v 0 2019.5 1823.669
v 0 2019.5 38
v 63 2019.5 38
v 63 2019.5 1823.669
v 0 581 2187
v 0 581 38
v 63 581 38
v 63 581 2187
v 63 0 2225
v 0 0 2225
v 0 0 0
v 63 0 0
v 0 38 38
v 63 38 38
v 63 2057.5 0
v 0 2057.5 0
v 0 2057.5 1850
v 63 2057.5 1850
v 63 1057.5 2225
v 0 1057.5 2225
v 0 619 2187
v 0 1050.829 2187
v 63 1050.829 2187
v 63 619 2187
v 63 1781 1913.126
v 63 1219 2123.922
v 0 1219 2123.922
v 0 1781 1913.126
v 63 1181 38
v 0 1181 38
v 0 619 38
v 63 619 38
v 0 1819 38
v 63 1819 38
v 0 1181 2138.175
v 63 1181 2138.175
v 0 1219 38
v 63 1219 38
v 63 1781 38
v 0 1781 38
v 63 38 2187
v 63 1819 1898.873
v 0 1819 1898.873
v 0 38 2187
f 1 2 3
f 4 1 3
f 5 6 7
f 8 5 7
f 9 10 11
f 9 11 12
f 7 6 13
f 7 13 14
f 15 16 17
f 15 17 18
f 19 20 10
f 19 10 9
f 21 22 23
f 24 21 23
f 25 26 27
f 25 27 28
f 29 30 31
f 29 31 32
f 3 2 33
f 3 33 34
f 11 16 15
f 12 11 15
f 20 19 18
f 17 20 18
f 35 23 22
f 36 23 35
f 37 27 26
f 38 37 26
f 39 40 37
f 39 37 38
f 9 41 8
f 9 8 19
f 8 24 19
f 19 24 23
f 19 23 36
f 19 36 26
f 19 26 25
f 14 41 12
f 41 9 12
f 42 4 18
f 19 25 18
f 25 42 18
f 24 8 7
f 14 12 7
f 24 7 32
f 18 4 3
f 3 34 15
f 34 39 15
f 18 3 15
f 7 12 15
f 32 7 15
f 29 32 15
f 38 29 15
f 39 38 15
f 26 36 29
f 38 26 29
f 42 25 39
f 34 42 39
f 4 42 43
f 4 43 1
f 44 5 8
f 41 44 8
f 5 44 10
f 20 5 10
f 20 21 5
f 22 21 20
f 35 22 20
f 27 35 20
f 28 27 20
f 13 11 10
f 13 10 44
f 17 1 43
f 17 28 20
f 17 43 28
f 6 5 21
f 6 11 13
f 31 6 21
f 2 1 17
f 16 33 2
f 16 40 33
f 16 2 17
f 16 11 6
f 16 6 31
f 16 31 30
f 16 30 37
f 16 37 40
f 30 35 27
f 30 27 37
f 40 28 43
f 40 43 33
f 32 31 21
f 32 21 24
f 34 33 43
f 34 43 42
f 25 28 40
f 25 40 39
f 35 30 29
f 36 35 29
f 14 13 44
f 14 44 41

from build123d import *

# Parameters (mm, degrees)
F0_W      = 63
F0_H      = 2057.5
F1_DEPTH  = 38
F2_W      = 63
F2_H      = 38
F3_DEPTH  = 2149
F4_W      = 63
F4_H      = 38
F5_DEPTH  = 2149
F6_W      = 63
F6_H      = 38
F7_DEPTH  = 2149
F8_W      = 63
F8_H      = 38
F9_DEPTH  = 2149
F10_W     = 63
F10_H     = 38
F11_DEPTH = 2149
F12_W     = 63
F12_H     = 1819.5122480392
F13_DEPTH = 38
F15_DEPTH = 63
F17_DEPTH = 63


with BuildPart() as f1:
    # F0 (on Top) → F1 (new body)
    with BuildSketch(Plane.XY):
        with Locations((31.5, 1028.75)):
            Rectangle(F0_W, F0_H)
    extrude(amount=F1_DEPTH)

    # F2 (on face) → F3 (join)
    with BuildSketch(Plane.XY.offset(38)):
        with Locations((31.5, 19)):
            Rectangle(F2_W, F2_H)
    extrude(amount=F3_DEPTH)

    # F4 (on face) → F5 (join)
    with BuildSketch(Plane.XY.offset(38)):
        with Locations((31.5, 600)):
            Rectangle(F4_W, F4_H)
    extrude(amount=F5_DEPTH)

    # F6 (on face) → F7 (join)
    with BuildSketch(Plane.XY.offset(38)):
        with Locations((31.5, 1200)):
            Rectangle(F6_W, F6_H)
    extrude(amount=F7_DEPTH)

    # F8 (on face) → F9 (join)
    with BuildSketch(Plane.XY.offset(38)):
        with Locations((31.5, 1800)):
            Rectangle(F8_W, F8_H)
    extrude(amount=F9_DEPTH)

    # F10 (on face) → F11 (join)
    with BuildSketch(Plane.XY.offset(38)):
        with Locations((31.5, 2038.5)):
            Rectangle(F10_W, F10_H)
    extrude(amount=F11_DEPTH)

    # F12 (on face) → F13 (join)
    with BuildSketch(Plane.XY.offset(2187)):
        with Locations((31.5, 909.7561240196)):
            Rectangle(F12_W, F12_H)
    extrude(amount=F13_DEPTH)

    # F14 (on face) → F15 (join)
    with BuildSketch(Plane.YZ.offset(63)):
        Polygon((1158.8333333333, 2187), (1057.5, 2225), (1050.8286546098, 2187), align=None)
        Polygon((2057.5, 1850), (1158.8333333333, 2187), (1050.8286546098, 2187), (2057.5, 1809.4159822097), align=None)
    extrude(amount=-F15_DEPTH)

    # F16 (on face) → F17 (cut)
    with BuildSketch(Plane.YZ.offset(63)):
        Polygon((1781, 2187), (1781, 1953.6875), (1819, 1939.4375), (1819, 2187), (1819.5122480392, 2187), (1819.5122480392, 2225), (1057.5, 2225), (1158.8333333333, 2187), (1181, 2187), (1181, 2178.6875), (1219, 2164.4375), (1219, 2187), align=None)
        Polygon((2019.5, 2187), (2019.5, 1864.25), (2057.5, 1850), (2057.5, 2187), align=None)
    extrude(amount=-F17_DEPTH, mode=Mode.SUBTRACT)


solid = f1.part
